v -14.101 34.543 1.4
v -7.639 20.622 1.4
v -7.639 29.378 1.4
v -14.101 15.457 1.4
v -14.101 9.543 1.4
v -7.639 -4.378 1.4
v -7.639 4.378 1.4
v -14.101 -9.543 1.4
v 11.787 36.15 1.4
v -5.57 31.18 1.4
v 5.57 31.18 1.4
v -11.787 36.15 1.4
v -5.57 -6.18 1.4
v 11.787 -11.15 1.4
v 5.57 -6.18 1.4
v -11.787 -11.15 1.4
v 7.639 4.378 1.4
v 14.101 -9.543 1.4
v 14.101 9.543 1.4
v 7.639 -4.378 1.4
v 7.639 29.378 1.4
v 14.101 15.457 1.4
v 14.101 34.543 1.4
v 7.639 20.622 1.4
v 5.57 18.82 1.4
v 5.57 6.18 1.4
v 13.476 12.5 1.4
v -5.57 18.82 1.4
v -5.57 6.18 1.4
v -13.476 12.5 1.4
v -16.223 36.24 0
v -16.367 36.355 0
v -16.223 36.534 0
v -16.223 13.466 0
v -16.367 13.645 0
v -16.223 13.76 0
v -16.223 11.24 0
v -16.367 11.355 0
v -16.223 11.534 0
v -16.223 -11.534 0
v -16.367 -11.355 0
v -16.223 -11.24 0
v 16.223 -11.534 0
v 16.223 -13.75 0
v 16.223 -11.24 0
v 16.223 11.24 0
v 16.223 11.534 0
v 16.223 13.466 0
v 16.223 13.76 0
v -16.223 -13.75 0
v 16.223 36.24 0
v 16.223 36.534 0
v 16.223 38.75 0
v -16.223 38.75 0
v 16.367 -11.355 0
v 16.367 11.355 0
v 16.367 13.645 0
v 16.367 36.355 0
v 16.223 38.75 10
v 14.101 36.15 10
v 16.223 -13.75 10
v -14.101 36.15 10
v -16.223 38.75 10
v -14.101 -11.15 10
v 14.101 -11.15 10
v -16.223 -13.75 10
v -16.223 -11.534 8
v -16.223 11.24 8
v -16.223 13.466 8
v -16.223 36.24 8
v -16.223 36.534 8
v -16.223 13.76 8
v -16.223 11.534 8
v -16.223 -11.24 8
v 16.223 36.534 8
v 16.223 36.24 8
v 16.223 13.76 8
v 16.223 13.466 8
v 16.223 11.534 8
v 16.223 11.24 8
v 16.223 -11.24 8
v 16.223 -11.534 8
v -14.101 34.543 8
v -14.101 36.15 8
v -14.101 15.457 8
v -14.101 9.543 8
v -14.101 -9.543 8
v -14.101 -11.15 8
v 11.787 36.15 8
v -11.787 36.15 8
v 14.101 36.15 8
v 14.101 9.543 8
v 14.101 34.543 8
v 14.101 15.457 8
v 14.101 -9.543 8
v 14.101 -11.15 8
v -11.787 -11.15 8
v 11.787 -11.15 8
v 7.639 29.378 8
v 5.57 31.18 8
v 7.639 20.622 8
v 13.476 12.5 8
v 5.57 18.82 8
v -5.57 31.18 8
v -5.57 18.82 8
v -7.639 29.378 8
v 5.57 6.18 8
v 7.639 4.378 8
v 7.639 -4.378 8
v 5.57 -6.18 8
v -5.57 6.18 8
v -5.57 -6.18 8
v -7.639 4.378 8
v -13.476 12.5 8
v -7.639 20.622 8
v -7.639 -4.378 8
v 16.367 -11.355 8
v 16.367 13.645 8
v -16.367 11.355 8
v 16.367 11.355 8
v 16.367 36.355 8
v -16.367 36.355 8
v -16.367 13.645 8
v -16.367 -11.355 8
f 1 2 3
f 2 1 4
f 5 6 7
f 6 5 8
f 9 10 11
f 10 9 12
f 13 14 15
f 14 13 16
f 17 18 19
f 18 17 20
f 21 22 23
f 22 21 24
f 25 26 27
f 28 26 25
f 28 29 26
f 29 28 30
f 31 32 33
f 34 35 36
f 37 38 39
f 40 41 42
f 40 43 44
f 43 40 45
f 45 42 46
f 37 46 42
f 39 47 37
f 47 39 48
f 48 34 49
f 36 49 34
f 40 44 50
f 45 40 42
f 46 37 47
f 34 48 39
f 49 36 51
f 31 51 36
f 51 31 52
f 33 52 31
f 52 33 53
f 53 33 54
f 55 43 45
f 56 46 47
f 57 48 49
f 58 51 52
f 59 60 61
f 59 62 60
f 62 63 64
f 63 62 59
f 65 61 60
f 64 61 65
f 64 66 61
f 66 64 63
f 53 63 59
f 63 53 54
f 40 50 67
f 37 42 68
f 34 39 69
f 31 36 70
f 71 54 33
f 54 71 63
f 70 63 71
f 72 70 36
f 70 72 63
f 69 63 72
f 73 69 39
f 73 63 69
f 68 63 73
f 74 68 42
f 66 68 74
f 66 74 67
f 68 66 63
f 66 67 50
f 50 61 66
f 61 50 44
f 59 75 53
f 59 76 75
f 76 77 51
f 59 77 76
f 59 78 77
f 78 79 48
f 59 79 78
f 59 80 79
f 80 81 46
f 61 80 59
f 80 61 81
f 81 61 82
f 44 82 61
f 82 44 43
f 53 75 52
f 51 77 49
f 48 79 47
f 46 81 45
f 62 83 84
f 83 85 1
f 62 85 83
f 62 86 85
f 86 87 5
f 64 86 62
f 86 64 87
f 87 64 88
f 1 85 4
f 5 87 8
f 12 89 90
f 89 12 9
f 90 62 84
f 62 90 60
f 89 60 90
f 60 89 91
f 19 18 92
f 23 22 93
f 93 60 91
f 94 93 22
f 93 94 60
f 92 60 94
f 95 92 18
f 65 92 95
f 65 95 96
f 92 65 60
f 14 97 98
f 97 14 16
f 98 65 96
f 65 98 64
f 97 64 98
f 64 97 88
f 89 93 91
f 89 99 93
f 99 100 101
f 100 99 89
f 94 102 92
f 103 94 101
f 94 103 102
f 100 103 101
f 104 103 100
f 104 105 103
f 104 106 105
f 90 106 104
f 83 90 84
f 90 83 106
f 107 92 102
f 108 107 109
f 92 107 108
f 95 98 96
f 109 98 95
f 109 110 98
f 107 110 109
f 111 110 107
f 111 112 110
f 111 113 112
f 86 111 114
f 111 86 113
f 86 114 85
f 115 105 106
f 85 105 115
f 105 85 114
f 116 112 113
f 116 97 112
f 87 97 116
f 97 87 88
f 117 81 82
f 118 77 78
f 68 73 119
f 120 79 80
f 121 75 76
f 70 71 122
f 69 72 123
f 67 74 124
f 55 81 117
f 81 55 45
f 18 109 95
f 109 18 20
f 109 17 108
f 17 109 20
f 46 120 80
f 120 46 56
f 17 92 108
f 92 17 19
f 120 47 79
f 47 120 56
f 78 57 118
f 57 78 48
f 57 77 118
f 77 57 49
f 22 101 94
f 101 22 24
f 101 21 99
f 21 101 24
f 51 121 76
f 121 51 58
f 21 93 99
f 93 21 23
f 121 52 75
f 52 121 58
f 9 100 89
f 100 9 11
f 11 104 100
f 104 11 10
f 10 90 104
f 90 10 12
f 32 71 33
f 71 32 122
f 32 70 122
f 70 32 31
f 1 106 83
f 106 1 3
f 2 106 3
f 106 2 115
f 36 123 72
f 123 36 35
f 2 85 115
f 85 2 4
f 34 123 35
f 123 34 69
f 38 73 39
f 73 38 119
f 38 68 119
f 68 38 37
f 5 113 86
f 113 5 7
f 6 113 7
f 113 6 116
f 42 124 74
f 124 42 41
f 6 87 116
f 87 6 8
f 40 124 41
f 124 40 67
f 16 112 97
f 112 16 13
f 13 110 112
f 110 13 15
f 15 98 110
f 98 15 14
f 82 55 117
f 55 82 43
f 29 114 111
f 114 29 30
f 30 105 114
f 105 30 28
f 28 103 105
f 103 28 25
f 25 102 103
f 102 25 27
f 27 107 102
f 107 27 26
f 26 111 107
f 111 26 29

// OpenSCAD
//
//
// 7segment display part to be built on makerbots.. a cheap part commonly available can still be rebuilt
// with unique size, material, and color, for interesting effect
//  
// r. miloh alexander,  may, 2011
//cc-sa
//


//Variables
7seg_size = 50;  	   // the controlling variable of this design, typically the largest variable
g_ratio	= 1.61803;  // the golden ratio
x_ratio	= 0.8;		//multiplier tacked onto the generation of the inner occlusion square
led_size	= 5;              // for sizing parts to fit different leds 
surface_thickness=1.4;	//2 z layers is ~0.8 and its kind of cool but generally too thin w/o extra diffusion
inside_height=8;	// total extrusion height
box_height=10;
wall_size 	= 2.7;		//  parmetizing the 7seg to keep wall size from increasing with arbitrary 7seg sizes
outside_wall_modifier  = 1.05;	 	// offset to fix problems...
led_socket_ratio	= 2.3;  // led sockets


// some arrays
base_array = [7seg_size/g_ratio,7seg_size/2];   // used to create a section of 3.5 segments for a 7seg
wall_array 	= [wall_size,wall_size]; 			// used to determine wall size


//-------------------------------------------------------
// call up the part
//-------------------------------------------------------

// comment the following line out if you just want the enclosure
seven_segments();
//comment the following out if you just want the internals light barrier
translate([0,7seg_size/4,0]) seven_segments_box();




//-------------------------------------------------------
//
//
// modules 
//
//--------------------------------------------------------

module seven_segments_box(){
  translate([0,0,surface_thickness/2])  cube([7seg_size/g_ratio,7seg_size,surface_thickness],center=true);
   linear_extrude(height=box_height)enclosure();
}

// this module builds the outside of the 7segment part
module enclosure(){
  	difference(){
		square([7seg_size/g_ratio,7seg_size]*outside_wall_modifier, center=true);
		square([7seg_size/g_ratio,7seg_size]-wall_array,center=true);
		}
}

// this module extrudes the 2D layout modules below
module seven_segments(){
linear_extrude (height=inside_height)seven_segments_flat();		
}

// this module duplicates the top_segments module to make the complete 2D layout of the inner part of a 7seg
module seven_segments_flat(){	
	top_segments();
	translate([0,7seg_size/2])top_segments();
}

// this module creates the 2D X shaped layout with inner square
module top_segments(){	
	square((base_array/g_ratio)*x_ratio,center=true);	  // change this to a polygon with cutouts for leds...
	hype =sqrt (pow((7seg_size/(2*g_ratio)),2) + pow((7seg_size)/4,2));
	bar =2* (hype);
	angle= 2.25*atan(1/(2*g_ratio));
	rotate(angle)square([bar,wall_size],center=true);
	rotate(-angle)square([bar,wall_size],center=true);
echo (str(angle));
}


module  led_socket(){
	difference(){
	cylinder(h =  led_size,r1=led_size/2*led_socket_ratio, r2=led_size/2,$fa=1,$fs=0.2);
	translate([0,0,0]) cylinder(h = led_size, r=led_size/2,$fa=1,$fs=0.2);
	}
}
